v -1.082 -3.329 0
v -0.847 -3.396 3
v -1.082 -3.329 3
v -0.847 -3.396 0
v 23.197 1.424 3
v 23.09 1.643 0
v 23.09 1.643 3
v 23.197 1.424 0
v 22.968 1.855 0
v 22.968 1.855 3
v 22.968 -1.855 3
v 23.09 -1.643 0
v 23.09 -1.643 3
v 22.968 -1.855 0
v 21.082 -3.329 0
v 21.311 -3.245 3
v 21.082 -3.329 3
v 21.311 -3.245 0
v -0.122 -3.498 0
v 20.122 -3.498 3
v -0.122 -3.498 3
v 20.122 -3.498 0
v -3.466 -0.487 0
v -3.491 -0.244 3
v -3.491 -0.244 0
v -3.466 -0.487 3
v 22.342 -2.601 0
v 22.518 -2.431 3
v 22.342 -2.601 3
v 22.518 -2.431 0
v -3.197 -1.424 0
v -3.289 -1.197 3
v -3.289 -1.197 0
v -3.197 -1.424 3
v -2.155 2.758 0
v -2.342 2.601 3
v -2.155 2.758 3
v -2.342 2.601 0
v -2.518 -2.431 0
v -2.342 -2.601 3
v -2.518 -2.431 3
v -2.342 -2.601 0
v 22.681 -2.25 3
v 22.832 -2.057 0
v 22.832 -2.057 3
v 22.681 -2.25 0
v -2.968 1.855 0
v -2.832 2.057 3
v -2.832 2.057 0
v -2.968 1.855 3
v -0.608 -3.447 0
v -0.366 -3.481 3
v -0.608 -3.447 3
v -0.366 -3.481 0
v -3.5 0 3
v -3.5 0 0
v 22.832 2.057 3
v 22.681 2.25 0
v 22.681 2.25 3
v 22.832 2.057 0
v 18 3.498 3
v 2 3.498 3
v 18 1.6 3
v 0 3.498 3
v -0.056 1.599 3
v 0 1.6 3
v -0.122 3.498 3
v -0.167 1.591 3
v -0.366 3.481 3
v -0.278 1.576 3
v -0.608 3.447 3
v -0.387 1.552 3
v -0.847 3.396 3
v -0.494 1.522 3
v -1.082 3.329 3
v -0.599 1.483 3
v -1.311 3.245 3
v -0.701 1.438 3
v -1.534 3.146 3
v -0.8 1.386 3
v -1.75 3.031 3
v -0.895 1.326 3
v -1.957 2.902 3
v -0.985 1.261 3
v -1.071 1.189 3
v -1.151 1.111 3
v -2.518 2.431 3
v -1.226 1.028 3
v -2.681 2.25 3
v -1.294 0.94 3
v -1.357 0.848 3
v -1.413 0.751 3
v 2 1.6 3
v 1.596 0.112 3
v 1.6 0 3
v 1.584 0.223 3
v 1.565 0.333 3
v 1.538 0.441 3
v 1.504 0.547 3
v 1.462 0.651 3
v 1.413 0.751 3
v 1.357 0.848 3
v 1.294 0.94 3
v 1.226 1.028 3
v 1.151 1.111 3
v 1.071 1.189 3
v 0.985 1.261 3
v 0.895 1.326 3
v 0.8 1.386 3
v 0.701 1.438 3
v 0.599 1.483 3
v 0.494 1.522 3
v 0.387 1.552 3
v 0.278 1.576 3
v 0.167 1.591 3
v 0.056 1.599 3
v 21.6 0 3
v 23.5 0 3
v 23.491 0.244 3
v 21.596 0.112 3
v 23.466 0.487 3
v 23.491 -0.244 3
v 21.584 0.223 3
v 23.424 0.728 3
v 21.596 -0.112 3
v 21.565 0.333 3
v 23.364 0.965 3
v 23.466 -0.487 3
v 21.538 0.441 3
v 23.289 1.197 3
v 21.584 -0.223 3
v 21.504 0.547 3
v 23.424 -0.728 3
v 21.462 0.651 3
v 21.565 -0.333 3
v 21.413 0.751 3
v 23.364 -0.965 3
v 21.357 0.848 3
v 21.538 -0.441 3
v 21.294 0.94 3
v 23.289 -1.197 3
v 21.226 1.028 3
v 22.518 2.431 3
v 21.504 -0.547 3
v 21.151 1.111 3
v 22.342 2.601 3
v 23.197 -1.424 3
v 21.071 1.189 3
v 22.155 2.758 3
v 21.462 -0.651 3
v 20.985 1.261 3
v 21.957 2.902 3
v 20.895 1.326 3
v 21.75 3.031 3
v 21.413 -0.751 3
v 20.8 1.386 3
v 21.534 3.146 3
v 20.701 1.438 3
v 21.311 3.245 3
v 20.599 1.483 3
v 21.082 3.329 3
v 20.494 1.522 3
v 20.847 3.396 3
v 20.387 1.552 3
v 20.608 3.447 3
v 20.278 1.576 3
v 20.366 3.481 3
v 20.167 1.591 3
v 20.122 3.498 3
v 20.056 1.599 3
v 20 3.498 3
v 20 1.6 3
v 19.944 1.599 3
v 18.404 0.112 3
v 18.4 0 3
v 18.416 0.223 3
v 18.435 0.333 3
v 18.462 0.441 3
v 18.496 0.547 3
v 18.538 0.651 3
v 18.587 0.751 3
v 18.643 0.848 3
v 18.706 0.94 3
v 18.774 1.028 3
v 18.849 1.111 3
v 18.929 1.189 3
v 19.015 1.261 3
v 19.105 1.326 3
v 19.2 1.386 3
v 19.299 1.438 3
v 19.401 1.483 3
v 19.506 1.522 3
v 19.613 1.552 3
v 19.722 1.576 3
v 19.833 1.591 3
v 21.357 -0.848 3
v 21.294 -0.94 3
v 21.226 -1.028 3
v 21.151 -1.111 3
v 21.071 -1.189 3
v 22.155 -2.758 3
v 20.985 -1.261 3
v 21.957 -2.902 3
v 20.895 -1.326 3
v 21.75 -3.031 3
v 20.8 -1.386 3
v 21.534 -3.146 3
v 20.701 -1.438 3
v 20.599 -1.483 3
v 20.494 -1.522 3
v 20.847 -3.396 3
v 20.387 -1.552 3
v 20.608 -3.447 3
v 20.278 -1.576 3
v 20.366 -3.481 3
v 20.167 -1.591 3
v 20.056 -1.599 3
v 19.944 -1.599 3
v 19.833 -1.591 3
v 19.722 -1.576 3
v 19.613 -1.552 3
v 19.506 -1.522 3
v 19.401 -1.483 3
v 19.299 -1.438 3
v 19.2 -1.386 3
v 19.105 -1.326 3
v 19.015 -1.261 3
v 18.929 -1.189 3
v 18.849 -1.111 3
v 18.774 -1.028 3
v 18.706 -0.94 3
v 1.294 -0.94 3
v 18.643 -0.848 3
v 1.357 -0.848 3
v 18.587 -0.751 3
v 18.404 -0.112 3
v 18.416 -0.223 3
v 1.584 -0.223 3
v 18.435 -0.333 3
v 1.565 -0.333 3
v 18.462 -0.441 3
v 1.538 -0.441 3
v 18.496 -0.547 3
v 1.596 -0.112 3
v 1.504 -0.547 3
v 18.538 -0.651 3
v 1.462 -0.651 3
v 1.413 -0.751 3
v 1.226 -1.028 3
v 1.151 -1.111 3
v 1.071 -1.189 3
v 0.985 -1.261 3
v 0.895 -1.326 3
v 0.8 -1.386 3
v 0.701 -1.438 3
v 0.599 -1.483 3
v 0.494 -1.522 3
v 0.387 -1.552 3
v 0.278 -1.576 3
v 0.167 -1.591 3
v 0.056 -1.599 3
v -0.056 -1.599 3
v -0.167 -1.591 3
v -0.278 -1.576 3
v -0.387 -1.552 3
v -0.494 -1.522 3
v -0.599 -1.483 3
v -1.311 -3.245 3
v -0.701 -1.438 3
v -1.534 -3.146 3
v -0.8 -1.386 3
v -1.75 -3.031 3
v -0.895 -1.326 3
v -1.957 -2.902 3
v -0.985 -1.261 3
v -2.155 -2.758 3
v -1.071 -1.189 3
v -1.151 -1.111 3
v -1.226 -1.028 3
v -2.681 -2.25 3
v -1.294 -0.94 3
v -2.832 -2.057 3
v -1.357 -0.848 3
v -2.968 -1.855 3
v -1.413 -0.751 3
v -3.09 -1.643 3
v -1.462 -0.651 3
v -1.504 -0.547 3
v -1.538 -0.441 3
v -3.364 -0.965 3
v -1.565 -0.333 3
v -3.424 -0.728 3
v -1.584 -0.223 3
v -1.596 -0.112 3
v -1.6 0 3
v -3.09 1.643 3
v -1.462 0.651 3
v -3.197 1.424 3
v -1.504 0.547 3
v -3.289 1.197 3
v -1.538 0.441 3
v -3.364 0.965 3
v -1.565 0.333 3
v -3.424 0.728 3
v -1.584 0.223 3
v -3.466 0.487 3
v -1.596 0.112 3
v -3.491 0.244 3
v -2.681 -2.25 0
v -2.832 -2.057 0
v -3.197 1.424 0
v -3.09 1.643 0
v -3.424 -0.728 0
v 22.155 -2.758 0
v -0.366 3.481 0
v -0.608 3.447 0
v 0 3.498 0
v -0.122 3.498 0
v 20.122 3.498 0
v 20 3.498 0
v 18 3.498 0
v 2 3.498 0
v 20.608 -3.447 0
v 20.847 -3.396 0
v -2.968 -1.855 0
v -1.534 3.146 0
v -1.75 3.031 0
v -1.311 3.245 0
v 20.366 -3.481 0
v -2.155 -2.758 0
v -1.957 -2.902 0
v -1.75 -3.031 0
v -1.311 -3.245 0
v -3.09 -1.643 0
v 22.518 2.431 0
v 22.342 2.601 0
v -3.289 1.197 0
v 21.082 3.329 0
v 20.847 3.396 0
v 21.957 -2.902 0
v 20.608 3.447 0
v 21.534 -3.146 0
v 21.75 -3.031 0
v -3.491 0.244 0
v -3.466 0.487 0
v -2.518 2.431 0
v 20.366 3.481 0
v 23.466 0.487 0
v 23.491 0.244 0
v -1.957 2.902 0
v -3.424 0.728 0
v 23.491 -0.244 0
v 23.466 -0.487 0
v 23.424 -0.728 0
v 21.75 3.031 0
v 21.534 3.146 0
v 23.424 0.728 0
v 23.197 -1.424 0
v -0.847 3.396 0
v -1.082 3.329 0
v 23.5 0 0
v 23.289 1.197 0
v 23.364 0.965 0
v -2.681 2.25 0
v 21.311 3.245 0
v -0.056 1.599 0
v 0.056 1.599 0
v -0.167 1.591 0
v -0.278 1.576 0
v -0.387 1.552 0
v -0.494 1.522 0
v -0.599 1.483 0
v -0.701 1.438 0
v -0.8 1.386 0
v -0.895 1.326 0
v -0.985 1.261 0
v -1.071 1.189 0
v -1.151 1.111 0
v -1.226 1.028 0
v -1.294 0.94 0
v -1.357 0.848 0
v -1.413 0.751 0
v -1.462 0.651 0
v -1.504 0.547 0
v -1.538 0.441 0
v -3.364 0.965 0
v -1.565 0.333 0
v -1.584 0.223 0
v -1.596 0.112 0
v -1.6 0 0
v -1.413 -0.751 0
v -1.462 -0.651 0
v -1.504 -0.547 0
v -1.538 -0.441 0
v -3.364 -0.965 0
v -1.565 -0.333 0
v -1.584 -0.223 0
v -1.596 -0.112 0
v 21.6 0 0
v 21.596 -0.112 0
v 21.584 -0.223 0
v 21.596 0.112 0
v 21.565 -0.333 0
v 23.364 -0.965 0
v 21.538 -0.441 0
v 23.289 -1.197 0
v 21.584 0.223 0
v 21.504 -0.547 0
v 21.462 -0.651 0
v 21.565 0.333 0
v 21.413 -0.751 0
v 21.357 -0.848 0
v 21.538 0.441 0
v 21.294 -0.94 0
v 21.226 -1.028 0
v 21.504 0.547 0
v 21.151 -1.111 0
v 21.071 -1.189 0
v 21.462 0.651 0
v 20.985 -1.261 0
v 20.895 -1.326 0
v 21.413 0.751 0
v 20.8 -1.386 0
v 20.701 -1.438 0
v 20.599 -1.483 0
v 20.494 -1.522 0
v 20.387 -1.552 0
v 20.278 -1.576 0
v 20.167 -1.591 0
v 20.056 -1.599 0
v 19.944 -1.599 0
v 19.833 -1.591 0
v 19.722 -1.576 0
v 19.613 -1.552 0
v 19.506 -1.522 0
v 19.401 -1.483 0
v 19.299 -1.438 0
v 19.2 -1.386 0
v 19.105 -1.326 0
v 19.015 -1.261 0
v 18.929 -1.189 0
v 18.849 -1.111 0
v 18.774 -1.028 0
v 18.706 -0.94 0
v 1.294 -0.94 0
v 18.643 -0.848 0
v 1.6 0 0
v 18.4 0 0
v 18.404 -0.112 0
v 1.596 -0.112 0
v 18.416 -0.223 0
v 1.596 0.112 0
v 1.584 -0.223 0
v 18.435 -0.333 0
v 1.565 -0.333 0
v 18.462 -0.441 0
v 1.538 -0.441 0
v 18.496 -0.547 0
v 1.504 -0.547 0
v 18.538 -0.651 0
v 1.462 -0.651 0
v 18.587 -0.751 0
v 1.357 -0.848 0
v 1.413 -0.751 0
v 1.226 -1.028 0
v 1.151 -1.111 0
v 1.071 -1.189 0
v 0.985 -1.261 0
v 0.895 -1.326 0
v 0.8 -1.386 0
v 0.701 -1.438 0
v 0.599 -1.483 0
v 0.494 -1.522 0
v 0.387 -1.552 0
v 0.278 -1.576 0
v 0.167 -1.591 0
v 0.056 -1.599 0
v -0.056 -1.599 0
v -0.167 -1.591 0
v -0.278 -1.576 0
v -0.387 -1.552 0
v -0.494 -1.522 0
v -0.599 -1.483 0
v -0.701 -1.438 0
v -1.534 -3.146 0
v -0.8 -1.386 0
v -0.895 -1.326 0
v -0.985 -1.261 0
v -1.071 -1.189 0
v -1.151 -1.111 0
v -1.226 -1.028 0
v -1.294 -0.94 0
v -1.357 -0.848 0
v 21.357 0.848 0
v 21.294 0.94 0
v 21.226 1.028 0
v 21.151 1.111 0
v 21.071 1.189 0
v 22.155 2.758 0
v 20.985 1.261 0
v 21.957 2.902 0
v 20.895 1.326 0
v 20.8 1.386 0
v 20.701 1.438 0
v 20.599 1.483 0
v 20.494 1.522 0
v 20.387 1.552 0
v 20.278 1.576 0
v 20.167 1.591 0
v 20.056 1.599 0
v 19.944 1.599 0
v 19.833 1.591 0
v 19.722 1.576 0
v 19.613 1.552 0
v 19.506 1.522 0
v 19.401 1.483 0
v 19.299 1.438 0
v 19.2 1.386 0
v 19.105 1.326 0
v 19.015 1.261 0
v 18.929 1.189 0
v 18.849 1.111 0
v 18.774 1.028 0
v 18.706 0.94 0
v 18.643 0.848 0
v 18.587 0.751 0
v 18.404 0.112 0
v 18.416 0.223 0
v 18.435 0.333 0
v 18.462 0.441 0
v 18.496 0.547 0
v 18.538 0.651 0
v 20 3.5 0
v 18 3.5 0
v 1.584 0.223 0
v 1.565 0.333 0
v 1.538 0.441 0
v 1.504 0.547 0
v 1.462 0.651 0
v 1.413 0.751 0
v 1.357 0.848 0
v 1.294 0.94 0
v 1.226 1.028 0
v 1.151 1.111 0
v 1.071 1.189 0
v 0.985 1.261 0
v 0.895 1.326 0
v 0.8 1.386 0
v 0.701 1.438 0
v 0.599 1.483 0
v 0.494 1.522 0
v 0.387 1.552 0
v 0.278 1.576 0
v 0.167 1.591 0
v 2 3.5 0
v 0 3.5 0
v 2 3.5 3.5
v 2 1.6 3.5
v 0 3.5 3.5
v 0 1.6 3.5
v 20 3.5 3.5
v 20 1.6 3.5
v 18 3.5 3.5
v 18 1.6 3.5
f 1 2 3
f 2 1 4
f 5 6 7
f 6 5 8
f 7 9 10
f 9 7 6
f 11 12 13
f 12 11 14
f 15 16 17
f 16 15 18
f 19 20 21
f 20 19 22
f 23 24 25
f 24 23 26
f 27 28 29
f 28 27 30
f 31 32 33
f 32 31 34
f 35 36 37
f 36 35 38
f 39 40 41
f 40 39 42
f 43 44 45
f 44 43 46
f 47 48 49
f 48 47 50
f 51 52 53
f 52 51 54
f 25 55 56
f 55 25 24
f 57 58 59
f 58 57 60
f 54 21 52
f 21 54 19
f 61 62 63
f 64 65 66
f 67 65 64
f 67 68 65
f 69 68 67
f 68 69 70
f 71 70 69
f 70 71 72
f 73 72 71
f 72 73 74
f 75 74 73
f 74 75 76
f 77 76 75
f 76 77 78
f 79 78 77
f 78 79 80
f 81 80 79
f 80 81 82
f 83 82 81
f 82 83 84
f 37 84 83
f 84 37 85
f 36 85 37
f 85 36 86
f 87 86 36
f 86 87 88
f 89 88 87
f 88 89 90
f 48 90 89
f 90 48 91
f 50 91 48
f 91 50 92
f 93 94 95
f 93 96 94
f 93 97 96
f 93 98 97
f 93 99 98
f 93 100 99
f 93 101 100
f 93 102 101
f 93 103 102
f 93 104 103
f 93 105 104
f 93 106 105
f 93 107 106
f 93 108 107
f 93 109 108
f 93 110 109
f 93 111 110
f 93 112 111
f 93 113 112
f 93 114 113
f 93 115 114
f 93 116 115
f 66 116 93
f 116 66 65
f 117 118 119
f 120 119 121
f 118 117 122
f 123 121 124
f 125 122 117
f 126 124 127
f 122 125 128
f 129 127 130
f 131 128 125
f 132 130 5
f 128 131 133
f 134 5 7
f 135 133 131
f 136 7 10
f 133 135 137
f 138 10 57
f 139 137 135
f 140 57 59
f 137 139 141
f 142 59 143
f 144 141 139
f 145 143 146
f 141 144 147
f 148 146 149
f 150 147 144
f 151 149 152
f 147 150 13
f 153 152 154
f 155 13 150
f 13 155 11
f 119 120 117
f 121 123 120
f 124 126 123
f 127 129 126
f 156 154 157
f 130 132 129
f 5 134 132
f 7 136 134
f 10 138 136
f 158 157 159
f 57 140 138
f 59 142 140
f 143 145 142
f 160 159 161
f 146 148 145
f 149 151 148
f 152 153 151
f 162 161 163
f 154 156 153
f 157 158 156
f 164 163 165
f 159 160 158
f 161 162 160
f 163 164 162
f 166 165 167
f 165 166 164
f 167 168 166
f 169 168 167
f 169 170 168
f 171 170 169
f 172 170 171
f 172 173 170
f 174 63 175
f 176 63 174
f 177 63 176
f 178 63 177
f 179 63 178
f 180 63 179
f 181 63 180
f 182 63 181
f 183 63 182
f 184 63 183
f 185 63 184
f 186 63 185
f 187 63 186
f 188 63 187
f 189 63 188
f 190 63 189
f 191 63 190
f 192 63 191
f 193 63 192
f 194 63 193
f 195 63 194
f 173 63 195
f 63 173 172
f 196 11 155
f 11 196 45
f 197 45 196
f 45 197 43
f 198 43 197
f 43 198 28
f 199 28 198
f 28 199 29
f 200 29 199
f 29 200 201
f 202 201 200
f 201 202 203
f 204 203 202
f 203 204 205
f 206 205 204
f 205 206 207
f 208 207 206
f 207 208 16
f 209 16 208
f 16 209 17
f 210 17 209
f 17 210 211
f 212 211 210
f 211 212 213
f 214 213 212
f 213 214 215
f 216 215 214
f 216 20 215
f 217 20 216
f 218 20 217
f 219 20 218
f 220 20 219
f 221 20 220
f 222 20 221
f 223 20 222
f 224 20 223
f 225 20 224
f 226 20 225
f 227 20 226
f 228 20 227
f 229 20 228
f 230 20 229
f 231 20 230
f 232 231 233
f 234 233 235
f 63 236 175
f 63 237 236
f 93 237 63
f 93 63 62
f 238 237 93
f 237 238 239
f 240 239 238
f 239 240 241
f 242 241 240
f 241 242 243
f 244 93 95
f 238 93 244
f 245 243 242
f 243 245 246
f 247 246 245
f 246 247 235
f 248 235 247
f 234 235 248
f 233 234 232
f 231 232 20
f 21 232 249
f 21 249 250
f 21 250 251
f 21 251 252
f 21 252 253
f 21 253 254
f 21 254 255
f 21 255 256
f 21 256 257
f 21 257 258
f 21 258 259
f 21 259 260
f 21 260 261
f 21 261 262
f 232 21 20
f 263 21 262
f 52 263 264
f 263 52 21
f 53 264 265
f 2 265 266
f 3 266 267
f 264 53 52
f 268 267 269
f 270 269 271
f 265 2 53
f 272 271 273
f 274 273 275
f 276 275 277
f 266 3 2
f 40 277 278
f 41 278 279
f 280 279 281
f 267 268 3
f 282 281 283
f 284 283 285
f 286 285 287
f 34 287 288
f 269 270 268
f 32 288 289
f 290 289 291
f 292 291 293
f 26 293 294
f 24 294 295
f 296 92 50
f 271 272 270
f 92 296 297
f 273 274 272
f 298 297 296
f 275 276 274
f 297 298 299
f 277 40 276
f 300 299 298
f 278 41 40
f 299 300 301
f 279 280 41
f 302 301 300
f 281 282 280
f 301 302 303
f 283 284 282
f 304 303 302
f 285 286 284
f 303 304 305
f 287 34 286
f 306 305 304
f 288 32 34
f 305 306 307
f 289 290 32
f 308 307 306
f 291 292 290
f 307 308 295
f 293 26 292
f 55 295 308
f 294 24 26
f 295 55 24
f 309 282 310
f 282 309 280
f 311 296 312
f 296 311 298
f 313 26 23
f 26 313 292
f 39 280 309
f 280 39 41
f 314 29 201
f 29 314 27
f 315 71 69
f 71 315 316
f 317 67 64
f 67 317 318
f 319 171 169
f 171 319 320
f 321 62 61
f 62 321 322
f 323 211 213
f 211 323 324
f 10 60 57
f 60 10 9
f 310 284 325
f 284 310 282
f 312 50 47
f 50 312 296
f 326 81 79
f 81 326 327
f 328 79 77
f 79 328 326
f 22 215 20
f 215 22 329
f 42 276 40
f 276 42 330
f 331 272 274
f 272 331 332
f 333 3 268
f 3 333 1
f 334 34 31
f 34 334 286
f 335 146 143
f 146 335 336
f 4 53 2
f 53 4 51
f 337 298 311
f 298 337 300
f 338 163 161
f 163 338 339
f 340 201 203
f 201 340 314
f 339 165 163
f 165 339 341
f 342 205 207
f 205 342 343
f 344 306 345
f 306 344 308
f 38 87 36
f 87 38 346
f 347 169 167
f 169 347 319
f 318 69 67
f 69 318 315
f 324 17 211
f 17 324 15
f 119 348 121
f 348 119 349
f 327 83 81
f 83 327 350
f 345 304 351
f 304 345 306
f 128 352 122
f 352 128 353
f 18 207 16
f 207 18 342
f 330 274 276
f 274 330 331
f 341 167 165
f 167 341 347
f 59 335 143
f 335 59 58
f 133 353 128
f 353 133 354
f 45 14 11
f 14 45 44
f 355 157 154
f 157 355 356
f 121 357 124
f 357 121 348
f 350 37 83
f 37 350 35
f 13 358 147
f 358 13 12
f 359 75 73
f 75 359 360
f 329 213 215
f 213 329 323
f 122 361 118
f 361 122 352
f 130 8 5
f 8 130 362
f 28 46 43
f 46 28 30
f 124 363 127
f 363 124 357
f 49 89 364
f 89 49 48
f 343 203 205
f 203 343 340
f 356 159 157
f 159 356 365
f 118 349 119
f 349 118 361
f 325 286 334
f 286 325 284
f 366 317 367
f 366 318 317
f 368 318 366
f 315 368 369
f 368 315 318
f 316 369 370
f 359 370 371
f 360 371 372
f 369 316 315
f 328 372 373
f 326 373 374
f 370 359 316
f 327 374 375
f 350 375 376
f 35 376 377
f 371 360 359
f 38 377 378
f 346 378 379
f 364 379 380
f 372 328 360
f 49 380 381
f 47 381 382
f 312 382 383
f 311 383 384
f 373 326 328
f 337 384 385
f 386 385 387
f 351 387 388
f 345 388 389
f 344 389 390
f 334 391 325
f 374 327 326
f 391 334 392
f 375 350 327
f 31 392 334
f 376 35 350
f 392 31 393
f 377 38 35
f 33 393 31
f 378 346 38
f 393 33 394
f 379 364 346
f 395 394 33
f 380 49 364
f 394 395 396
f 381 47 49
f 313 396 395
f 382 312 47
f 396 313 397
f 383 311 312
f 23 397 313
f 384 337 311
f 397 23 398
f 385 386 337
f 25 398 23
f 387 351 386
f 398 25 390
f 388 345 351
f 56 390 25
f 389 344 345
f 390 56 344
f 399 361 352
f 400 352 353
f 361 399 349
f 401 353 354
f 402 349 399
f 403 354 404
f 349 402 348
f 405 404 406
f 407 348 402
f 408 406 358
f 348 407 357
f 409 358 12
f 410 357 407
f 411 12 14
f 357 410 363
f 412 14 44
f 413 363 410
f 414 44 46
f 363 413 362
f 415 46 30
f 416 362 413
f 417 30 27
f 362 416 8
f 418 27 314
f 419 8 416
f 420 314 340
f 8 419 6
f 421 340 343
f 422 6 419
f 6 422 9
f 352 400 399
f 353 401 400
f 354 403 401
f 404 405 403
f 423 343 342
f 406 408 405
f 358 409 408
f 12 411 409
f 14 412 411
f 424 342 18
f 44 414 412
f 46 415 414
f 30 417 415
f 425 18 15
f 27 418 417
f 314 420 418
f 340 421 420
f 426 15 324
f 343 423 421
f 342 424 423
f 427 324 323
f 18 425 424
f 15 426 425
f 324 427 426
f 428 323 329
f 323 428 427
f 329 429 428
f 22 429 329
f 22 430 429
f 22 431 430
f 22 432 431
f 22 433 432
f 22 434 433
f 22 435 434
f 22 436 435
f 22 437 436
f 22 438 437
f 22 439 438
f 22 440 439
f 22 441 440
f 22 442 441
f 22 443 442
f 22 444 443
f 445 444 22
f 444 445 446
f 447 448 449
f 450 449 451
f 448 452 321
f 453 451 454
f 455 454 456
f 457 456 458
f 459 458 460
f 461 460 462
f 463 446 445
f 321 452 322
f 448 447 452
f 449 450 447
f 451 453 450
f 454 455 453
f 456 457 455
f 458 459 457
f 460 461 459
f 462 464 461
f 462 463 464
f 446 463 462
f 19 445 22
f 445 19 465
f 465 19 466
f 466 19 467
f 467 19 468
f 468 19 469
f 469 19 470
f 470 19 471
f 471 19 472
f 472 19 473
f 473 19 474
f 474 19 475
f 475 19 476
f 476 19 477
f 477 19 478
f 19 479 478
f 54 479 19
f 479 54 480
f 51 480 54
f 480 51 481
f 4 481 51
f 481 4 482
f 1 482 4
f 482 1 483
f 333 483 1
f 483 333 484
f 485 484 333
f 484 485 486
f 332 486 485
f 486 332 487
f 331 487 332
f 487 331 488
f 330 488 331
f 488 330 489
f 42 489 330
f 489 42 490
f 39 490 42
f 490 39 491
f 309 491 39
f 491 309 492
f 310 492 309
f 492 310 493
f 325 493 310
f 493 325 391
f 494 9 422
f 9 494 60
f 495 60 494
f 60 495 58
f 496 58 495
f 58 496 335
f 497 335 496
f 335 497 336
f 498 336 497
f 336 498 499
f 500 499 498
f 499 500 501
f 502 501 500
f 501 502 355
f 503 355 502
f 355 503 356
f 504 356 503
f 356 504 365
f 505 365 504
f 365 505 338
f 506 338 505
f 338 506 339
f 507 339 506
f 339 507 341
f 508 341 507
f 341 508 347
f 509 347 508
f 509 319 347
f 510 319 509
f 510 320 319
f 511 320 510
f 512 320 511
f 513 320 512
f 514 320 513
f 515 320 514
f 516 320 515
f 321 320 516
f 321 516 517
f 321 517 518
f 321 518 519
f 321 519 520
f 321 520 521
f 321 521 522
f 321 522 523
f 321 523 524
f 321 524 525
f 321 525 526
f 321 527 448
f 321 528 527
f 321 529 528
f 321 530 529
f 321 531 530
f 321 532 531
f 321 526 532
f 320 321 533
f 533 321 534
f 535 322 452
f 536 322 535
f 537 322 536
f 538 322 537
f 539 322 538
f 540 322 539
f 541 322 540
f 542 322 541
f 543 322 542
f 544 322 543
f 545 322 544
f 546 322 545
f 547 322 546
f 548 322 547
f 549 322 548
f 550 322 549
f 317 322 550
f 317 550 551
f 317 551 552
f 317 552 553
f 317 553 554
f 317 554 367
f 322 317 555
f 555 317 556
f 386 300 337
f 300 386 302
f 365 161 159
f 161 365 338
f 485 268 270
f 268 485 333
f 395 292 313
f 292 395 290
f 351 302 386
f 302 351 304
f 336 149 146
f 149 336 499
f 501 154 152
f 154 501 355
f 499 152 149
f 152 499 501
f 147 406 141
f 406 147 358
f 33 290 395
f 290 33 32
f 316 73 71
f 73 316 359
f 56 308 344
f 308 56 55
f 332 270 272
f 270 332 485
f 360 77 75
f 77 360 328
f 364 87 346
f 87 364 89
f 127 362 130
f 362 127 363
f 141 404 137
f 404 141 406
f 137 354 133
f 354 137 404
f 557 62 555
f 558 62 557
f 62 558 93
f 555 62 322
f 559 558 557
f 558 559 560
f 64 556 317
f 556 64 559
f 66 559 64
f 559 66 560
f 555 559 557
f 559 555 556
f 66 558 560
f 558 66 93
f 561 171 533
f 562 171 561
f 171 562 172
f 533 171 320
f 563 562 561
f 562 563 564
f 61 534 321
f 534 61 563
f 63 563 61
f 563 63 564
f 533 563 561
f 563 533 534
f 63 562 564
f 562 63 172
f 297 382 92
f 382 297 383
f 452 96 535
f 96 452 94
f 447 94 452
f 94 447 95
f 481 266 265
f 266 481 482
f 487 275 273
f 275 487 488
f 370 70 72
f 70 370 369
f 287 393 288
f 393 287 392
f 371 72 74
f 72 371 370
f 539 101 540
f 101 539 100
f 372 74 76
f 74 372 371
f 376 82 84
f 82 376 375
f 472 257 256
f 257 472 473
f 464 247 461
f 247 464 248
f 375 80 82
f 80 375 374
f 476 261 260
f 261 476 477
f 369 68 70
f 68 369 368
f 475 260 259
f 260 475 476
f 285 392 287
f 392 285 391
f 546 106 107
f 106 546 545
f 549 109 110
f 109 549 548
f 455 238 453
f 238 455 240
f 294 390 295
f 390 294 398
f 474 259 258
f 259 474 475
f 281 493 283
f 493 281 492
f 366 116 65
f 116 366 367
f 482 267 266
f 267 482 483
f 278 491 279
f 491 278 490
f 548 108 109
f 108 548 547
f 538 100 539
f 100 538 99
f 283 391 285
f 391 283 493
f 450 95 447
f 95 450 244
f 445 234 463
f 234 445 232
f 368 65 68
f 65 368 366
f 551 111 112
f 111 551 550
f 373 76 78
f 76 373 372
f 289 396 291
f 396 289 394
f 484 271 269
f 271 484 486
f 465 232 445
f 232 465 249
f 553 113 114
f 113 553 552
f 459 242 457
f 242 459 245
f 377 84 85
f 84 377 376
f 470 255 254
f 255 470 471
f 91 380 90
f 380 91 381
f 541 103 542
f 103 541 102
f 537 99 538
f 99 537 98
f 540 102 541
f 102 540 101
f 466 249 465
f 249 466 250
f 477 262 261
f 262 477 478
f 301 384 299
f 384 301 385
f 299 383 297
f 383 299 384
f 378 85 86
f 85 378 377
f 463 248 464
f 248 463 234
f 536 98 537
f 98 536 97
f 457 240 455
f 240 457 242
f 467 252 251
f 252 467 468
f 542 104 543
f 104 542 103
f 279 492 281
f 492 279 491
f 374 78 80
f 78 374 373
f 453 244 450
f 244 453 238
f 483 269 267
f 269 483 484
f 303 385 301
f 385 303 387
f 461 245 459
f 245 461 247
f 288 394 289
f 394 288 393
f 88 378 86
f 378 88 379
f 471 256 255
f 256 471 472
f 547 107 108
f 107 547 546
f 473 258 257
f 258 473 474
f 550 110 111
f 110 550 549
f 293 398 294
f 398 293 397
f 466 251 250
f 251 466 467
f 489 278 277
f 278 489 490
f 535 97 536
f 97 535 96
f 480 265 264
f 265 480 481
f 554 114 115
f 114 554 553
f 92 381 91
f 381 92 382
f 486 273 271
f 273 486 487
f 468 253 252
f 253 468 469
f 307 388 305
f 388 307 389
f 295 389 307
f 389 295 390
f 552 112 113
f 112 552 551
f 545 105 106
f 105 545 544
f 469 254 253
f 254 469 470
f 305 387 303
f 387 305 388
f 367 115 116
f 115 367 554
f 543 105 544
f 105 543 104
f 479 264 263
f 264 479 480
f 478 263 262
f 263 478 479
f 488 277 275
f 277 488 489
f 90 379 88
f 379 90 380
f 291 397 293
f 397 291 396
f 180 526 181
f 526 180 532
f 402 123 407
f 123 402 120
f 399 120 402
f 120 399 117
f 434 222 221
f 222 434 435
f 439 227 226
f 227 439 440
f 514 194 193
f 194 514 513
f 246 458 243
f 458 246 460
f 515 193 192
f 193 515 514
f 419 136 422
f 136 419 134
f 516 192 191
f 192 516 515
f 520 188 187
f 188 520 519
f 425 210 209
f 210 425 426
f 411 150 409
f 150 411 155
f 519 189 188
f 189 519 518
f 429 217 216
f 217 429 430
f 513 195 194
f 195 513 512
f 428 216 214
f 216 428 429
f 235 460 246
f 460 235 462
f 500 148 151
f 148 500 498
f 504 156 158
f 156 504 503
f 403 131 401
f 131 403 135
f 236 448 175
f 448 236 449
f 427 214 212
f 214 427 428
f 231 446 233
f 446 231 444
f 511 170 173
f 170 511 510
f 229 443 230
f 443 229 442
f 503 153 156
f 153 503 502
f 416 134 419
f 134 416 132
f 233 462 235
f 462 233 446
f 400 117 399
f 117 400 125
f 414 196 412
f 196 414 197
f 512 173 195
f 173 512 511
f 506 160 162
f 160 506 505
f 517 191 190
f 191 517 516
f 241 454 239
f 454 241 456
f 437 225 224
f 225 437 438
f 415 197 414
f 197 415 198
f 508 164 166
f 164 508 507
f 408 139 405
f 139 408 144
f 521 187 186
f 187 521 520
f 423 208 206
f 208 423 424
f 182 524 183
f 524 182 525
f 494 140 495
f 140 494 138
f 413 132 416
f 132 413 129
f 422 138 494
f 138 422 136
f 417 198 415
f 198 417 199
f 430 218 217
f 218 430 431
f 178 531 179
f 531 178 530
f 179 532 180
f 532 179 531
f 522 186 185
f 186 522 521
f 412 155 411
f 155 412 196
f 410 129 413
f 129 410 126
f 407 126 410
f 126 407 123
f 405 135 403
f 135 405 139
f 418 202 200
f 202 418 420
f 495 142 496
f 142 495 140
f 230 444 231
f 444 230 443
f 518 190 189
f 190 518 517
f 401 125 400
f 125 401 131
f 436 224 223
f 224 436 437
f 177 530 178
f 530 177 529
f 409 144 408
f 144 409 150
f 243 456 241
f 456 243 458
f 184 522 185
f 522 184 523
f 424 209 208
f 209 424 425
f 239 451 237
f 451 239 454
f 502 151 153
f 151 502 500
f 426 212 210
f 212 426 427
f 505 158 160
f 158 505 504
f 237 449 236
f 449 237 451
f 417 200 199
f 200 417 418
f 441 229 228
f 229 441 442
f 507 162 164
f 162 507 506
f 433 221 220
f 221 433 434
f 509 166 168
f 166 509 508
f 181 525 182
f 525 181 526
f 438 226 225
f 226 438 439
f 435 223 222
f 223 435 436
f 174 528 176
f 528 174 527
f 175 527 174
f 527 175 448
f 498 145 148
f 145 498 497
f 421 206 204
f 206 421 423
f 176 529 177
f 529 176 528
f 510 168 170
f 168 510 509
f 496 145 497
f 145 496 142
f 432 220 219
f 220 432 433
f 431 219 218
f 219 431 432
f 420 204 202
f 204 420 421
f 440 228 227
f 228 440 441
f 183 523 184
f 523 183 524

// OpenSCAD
$fn=90;
difference(){
    union(){
        hull(){
            cylinder(h=3,d=7);
            translate([20,0]) cylinder(h=3,d=7);
        }
        translate([0,1.6])cube([2,1.9,3.5]);
        translate([18,1.6])cube([2,1.9,3.5]);
    }
    cylinder(h=10,d=3.2);
    translate([20,0]) cylinder(h=10,d=3.2);
}
